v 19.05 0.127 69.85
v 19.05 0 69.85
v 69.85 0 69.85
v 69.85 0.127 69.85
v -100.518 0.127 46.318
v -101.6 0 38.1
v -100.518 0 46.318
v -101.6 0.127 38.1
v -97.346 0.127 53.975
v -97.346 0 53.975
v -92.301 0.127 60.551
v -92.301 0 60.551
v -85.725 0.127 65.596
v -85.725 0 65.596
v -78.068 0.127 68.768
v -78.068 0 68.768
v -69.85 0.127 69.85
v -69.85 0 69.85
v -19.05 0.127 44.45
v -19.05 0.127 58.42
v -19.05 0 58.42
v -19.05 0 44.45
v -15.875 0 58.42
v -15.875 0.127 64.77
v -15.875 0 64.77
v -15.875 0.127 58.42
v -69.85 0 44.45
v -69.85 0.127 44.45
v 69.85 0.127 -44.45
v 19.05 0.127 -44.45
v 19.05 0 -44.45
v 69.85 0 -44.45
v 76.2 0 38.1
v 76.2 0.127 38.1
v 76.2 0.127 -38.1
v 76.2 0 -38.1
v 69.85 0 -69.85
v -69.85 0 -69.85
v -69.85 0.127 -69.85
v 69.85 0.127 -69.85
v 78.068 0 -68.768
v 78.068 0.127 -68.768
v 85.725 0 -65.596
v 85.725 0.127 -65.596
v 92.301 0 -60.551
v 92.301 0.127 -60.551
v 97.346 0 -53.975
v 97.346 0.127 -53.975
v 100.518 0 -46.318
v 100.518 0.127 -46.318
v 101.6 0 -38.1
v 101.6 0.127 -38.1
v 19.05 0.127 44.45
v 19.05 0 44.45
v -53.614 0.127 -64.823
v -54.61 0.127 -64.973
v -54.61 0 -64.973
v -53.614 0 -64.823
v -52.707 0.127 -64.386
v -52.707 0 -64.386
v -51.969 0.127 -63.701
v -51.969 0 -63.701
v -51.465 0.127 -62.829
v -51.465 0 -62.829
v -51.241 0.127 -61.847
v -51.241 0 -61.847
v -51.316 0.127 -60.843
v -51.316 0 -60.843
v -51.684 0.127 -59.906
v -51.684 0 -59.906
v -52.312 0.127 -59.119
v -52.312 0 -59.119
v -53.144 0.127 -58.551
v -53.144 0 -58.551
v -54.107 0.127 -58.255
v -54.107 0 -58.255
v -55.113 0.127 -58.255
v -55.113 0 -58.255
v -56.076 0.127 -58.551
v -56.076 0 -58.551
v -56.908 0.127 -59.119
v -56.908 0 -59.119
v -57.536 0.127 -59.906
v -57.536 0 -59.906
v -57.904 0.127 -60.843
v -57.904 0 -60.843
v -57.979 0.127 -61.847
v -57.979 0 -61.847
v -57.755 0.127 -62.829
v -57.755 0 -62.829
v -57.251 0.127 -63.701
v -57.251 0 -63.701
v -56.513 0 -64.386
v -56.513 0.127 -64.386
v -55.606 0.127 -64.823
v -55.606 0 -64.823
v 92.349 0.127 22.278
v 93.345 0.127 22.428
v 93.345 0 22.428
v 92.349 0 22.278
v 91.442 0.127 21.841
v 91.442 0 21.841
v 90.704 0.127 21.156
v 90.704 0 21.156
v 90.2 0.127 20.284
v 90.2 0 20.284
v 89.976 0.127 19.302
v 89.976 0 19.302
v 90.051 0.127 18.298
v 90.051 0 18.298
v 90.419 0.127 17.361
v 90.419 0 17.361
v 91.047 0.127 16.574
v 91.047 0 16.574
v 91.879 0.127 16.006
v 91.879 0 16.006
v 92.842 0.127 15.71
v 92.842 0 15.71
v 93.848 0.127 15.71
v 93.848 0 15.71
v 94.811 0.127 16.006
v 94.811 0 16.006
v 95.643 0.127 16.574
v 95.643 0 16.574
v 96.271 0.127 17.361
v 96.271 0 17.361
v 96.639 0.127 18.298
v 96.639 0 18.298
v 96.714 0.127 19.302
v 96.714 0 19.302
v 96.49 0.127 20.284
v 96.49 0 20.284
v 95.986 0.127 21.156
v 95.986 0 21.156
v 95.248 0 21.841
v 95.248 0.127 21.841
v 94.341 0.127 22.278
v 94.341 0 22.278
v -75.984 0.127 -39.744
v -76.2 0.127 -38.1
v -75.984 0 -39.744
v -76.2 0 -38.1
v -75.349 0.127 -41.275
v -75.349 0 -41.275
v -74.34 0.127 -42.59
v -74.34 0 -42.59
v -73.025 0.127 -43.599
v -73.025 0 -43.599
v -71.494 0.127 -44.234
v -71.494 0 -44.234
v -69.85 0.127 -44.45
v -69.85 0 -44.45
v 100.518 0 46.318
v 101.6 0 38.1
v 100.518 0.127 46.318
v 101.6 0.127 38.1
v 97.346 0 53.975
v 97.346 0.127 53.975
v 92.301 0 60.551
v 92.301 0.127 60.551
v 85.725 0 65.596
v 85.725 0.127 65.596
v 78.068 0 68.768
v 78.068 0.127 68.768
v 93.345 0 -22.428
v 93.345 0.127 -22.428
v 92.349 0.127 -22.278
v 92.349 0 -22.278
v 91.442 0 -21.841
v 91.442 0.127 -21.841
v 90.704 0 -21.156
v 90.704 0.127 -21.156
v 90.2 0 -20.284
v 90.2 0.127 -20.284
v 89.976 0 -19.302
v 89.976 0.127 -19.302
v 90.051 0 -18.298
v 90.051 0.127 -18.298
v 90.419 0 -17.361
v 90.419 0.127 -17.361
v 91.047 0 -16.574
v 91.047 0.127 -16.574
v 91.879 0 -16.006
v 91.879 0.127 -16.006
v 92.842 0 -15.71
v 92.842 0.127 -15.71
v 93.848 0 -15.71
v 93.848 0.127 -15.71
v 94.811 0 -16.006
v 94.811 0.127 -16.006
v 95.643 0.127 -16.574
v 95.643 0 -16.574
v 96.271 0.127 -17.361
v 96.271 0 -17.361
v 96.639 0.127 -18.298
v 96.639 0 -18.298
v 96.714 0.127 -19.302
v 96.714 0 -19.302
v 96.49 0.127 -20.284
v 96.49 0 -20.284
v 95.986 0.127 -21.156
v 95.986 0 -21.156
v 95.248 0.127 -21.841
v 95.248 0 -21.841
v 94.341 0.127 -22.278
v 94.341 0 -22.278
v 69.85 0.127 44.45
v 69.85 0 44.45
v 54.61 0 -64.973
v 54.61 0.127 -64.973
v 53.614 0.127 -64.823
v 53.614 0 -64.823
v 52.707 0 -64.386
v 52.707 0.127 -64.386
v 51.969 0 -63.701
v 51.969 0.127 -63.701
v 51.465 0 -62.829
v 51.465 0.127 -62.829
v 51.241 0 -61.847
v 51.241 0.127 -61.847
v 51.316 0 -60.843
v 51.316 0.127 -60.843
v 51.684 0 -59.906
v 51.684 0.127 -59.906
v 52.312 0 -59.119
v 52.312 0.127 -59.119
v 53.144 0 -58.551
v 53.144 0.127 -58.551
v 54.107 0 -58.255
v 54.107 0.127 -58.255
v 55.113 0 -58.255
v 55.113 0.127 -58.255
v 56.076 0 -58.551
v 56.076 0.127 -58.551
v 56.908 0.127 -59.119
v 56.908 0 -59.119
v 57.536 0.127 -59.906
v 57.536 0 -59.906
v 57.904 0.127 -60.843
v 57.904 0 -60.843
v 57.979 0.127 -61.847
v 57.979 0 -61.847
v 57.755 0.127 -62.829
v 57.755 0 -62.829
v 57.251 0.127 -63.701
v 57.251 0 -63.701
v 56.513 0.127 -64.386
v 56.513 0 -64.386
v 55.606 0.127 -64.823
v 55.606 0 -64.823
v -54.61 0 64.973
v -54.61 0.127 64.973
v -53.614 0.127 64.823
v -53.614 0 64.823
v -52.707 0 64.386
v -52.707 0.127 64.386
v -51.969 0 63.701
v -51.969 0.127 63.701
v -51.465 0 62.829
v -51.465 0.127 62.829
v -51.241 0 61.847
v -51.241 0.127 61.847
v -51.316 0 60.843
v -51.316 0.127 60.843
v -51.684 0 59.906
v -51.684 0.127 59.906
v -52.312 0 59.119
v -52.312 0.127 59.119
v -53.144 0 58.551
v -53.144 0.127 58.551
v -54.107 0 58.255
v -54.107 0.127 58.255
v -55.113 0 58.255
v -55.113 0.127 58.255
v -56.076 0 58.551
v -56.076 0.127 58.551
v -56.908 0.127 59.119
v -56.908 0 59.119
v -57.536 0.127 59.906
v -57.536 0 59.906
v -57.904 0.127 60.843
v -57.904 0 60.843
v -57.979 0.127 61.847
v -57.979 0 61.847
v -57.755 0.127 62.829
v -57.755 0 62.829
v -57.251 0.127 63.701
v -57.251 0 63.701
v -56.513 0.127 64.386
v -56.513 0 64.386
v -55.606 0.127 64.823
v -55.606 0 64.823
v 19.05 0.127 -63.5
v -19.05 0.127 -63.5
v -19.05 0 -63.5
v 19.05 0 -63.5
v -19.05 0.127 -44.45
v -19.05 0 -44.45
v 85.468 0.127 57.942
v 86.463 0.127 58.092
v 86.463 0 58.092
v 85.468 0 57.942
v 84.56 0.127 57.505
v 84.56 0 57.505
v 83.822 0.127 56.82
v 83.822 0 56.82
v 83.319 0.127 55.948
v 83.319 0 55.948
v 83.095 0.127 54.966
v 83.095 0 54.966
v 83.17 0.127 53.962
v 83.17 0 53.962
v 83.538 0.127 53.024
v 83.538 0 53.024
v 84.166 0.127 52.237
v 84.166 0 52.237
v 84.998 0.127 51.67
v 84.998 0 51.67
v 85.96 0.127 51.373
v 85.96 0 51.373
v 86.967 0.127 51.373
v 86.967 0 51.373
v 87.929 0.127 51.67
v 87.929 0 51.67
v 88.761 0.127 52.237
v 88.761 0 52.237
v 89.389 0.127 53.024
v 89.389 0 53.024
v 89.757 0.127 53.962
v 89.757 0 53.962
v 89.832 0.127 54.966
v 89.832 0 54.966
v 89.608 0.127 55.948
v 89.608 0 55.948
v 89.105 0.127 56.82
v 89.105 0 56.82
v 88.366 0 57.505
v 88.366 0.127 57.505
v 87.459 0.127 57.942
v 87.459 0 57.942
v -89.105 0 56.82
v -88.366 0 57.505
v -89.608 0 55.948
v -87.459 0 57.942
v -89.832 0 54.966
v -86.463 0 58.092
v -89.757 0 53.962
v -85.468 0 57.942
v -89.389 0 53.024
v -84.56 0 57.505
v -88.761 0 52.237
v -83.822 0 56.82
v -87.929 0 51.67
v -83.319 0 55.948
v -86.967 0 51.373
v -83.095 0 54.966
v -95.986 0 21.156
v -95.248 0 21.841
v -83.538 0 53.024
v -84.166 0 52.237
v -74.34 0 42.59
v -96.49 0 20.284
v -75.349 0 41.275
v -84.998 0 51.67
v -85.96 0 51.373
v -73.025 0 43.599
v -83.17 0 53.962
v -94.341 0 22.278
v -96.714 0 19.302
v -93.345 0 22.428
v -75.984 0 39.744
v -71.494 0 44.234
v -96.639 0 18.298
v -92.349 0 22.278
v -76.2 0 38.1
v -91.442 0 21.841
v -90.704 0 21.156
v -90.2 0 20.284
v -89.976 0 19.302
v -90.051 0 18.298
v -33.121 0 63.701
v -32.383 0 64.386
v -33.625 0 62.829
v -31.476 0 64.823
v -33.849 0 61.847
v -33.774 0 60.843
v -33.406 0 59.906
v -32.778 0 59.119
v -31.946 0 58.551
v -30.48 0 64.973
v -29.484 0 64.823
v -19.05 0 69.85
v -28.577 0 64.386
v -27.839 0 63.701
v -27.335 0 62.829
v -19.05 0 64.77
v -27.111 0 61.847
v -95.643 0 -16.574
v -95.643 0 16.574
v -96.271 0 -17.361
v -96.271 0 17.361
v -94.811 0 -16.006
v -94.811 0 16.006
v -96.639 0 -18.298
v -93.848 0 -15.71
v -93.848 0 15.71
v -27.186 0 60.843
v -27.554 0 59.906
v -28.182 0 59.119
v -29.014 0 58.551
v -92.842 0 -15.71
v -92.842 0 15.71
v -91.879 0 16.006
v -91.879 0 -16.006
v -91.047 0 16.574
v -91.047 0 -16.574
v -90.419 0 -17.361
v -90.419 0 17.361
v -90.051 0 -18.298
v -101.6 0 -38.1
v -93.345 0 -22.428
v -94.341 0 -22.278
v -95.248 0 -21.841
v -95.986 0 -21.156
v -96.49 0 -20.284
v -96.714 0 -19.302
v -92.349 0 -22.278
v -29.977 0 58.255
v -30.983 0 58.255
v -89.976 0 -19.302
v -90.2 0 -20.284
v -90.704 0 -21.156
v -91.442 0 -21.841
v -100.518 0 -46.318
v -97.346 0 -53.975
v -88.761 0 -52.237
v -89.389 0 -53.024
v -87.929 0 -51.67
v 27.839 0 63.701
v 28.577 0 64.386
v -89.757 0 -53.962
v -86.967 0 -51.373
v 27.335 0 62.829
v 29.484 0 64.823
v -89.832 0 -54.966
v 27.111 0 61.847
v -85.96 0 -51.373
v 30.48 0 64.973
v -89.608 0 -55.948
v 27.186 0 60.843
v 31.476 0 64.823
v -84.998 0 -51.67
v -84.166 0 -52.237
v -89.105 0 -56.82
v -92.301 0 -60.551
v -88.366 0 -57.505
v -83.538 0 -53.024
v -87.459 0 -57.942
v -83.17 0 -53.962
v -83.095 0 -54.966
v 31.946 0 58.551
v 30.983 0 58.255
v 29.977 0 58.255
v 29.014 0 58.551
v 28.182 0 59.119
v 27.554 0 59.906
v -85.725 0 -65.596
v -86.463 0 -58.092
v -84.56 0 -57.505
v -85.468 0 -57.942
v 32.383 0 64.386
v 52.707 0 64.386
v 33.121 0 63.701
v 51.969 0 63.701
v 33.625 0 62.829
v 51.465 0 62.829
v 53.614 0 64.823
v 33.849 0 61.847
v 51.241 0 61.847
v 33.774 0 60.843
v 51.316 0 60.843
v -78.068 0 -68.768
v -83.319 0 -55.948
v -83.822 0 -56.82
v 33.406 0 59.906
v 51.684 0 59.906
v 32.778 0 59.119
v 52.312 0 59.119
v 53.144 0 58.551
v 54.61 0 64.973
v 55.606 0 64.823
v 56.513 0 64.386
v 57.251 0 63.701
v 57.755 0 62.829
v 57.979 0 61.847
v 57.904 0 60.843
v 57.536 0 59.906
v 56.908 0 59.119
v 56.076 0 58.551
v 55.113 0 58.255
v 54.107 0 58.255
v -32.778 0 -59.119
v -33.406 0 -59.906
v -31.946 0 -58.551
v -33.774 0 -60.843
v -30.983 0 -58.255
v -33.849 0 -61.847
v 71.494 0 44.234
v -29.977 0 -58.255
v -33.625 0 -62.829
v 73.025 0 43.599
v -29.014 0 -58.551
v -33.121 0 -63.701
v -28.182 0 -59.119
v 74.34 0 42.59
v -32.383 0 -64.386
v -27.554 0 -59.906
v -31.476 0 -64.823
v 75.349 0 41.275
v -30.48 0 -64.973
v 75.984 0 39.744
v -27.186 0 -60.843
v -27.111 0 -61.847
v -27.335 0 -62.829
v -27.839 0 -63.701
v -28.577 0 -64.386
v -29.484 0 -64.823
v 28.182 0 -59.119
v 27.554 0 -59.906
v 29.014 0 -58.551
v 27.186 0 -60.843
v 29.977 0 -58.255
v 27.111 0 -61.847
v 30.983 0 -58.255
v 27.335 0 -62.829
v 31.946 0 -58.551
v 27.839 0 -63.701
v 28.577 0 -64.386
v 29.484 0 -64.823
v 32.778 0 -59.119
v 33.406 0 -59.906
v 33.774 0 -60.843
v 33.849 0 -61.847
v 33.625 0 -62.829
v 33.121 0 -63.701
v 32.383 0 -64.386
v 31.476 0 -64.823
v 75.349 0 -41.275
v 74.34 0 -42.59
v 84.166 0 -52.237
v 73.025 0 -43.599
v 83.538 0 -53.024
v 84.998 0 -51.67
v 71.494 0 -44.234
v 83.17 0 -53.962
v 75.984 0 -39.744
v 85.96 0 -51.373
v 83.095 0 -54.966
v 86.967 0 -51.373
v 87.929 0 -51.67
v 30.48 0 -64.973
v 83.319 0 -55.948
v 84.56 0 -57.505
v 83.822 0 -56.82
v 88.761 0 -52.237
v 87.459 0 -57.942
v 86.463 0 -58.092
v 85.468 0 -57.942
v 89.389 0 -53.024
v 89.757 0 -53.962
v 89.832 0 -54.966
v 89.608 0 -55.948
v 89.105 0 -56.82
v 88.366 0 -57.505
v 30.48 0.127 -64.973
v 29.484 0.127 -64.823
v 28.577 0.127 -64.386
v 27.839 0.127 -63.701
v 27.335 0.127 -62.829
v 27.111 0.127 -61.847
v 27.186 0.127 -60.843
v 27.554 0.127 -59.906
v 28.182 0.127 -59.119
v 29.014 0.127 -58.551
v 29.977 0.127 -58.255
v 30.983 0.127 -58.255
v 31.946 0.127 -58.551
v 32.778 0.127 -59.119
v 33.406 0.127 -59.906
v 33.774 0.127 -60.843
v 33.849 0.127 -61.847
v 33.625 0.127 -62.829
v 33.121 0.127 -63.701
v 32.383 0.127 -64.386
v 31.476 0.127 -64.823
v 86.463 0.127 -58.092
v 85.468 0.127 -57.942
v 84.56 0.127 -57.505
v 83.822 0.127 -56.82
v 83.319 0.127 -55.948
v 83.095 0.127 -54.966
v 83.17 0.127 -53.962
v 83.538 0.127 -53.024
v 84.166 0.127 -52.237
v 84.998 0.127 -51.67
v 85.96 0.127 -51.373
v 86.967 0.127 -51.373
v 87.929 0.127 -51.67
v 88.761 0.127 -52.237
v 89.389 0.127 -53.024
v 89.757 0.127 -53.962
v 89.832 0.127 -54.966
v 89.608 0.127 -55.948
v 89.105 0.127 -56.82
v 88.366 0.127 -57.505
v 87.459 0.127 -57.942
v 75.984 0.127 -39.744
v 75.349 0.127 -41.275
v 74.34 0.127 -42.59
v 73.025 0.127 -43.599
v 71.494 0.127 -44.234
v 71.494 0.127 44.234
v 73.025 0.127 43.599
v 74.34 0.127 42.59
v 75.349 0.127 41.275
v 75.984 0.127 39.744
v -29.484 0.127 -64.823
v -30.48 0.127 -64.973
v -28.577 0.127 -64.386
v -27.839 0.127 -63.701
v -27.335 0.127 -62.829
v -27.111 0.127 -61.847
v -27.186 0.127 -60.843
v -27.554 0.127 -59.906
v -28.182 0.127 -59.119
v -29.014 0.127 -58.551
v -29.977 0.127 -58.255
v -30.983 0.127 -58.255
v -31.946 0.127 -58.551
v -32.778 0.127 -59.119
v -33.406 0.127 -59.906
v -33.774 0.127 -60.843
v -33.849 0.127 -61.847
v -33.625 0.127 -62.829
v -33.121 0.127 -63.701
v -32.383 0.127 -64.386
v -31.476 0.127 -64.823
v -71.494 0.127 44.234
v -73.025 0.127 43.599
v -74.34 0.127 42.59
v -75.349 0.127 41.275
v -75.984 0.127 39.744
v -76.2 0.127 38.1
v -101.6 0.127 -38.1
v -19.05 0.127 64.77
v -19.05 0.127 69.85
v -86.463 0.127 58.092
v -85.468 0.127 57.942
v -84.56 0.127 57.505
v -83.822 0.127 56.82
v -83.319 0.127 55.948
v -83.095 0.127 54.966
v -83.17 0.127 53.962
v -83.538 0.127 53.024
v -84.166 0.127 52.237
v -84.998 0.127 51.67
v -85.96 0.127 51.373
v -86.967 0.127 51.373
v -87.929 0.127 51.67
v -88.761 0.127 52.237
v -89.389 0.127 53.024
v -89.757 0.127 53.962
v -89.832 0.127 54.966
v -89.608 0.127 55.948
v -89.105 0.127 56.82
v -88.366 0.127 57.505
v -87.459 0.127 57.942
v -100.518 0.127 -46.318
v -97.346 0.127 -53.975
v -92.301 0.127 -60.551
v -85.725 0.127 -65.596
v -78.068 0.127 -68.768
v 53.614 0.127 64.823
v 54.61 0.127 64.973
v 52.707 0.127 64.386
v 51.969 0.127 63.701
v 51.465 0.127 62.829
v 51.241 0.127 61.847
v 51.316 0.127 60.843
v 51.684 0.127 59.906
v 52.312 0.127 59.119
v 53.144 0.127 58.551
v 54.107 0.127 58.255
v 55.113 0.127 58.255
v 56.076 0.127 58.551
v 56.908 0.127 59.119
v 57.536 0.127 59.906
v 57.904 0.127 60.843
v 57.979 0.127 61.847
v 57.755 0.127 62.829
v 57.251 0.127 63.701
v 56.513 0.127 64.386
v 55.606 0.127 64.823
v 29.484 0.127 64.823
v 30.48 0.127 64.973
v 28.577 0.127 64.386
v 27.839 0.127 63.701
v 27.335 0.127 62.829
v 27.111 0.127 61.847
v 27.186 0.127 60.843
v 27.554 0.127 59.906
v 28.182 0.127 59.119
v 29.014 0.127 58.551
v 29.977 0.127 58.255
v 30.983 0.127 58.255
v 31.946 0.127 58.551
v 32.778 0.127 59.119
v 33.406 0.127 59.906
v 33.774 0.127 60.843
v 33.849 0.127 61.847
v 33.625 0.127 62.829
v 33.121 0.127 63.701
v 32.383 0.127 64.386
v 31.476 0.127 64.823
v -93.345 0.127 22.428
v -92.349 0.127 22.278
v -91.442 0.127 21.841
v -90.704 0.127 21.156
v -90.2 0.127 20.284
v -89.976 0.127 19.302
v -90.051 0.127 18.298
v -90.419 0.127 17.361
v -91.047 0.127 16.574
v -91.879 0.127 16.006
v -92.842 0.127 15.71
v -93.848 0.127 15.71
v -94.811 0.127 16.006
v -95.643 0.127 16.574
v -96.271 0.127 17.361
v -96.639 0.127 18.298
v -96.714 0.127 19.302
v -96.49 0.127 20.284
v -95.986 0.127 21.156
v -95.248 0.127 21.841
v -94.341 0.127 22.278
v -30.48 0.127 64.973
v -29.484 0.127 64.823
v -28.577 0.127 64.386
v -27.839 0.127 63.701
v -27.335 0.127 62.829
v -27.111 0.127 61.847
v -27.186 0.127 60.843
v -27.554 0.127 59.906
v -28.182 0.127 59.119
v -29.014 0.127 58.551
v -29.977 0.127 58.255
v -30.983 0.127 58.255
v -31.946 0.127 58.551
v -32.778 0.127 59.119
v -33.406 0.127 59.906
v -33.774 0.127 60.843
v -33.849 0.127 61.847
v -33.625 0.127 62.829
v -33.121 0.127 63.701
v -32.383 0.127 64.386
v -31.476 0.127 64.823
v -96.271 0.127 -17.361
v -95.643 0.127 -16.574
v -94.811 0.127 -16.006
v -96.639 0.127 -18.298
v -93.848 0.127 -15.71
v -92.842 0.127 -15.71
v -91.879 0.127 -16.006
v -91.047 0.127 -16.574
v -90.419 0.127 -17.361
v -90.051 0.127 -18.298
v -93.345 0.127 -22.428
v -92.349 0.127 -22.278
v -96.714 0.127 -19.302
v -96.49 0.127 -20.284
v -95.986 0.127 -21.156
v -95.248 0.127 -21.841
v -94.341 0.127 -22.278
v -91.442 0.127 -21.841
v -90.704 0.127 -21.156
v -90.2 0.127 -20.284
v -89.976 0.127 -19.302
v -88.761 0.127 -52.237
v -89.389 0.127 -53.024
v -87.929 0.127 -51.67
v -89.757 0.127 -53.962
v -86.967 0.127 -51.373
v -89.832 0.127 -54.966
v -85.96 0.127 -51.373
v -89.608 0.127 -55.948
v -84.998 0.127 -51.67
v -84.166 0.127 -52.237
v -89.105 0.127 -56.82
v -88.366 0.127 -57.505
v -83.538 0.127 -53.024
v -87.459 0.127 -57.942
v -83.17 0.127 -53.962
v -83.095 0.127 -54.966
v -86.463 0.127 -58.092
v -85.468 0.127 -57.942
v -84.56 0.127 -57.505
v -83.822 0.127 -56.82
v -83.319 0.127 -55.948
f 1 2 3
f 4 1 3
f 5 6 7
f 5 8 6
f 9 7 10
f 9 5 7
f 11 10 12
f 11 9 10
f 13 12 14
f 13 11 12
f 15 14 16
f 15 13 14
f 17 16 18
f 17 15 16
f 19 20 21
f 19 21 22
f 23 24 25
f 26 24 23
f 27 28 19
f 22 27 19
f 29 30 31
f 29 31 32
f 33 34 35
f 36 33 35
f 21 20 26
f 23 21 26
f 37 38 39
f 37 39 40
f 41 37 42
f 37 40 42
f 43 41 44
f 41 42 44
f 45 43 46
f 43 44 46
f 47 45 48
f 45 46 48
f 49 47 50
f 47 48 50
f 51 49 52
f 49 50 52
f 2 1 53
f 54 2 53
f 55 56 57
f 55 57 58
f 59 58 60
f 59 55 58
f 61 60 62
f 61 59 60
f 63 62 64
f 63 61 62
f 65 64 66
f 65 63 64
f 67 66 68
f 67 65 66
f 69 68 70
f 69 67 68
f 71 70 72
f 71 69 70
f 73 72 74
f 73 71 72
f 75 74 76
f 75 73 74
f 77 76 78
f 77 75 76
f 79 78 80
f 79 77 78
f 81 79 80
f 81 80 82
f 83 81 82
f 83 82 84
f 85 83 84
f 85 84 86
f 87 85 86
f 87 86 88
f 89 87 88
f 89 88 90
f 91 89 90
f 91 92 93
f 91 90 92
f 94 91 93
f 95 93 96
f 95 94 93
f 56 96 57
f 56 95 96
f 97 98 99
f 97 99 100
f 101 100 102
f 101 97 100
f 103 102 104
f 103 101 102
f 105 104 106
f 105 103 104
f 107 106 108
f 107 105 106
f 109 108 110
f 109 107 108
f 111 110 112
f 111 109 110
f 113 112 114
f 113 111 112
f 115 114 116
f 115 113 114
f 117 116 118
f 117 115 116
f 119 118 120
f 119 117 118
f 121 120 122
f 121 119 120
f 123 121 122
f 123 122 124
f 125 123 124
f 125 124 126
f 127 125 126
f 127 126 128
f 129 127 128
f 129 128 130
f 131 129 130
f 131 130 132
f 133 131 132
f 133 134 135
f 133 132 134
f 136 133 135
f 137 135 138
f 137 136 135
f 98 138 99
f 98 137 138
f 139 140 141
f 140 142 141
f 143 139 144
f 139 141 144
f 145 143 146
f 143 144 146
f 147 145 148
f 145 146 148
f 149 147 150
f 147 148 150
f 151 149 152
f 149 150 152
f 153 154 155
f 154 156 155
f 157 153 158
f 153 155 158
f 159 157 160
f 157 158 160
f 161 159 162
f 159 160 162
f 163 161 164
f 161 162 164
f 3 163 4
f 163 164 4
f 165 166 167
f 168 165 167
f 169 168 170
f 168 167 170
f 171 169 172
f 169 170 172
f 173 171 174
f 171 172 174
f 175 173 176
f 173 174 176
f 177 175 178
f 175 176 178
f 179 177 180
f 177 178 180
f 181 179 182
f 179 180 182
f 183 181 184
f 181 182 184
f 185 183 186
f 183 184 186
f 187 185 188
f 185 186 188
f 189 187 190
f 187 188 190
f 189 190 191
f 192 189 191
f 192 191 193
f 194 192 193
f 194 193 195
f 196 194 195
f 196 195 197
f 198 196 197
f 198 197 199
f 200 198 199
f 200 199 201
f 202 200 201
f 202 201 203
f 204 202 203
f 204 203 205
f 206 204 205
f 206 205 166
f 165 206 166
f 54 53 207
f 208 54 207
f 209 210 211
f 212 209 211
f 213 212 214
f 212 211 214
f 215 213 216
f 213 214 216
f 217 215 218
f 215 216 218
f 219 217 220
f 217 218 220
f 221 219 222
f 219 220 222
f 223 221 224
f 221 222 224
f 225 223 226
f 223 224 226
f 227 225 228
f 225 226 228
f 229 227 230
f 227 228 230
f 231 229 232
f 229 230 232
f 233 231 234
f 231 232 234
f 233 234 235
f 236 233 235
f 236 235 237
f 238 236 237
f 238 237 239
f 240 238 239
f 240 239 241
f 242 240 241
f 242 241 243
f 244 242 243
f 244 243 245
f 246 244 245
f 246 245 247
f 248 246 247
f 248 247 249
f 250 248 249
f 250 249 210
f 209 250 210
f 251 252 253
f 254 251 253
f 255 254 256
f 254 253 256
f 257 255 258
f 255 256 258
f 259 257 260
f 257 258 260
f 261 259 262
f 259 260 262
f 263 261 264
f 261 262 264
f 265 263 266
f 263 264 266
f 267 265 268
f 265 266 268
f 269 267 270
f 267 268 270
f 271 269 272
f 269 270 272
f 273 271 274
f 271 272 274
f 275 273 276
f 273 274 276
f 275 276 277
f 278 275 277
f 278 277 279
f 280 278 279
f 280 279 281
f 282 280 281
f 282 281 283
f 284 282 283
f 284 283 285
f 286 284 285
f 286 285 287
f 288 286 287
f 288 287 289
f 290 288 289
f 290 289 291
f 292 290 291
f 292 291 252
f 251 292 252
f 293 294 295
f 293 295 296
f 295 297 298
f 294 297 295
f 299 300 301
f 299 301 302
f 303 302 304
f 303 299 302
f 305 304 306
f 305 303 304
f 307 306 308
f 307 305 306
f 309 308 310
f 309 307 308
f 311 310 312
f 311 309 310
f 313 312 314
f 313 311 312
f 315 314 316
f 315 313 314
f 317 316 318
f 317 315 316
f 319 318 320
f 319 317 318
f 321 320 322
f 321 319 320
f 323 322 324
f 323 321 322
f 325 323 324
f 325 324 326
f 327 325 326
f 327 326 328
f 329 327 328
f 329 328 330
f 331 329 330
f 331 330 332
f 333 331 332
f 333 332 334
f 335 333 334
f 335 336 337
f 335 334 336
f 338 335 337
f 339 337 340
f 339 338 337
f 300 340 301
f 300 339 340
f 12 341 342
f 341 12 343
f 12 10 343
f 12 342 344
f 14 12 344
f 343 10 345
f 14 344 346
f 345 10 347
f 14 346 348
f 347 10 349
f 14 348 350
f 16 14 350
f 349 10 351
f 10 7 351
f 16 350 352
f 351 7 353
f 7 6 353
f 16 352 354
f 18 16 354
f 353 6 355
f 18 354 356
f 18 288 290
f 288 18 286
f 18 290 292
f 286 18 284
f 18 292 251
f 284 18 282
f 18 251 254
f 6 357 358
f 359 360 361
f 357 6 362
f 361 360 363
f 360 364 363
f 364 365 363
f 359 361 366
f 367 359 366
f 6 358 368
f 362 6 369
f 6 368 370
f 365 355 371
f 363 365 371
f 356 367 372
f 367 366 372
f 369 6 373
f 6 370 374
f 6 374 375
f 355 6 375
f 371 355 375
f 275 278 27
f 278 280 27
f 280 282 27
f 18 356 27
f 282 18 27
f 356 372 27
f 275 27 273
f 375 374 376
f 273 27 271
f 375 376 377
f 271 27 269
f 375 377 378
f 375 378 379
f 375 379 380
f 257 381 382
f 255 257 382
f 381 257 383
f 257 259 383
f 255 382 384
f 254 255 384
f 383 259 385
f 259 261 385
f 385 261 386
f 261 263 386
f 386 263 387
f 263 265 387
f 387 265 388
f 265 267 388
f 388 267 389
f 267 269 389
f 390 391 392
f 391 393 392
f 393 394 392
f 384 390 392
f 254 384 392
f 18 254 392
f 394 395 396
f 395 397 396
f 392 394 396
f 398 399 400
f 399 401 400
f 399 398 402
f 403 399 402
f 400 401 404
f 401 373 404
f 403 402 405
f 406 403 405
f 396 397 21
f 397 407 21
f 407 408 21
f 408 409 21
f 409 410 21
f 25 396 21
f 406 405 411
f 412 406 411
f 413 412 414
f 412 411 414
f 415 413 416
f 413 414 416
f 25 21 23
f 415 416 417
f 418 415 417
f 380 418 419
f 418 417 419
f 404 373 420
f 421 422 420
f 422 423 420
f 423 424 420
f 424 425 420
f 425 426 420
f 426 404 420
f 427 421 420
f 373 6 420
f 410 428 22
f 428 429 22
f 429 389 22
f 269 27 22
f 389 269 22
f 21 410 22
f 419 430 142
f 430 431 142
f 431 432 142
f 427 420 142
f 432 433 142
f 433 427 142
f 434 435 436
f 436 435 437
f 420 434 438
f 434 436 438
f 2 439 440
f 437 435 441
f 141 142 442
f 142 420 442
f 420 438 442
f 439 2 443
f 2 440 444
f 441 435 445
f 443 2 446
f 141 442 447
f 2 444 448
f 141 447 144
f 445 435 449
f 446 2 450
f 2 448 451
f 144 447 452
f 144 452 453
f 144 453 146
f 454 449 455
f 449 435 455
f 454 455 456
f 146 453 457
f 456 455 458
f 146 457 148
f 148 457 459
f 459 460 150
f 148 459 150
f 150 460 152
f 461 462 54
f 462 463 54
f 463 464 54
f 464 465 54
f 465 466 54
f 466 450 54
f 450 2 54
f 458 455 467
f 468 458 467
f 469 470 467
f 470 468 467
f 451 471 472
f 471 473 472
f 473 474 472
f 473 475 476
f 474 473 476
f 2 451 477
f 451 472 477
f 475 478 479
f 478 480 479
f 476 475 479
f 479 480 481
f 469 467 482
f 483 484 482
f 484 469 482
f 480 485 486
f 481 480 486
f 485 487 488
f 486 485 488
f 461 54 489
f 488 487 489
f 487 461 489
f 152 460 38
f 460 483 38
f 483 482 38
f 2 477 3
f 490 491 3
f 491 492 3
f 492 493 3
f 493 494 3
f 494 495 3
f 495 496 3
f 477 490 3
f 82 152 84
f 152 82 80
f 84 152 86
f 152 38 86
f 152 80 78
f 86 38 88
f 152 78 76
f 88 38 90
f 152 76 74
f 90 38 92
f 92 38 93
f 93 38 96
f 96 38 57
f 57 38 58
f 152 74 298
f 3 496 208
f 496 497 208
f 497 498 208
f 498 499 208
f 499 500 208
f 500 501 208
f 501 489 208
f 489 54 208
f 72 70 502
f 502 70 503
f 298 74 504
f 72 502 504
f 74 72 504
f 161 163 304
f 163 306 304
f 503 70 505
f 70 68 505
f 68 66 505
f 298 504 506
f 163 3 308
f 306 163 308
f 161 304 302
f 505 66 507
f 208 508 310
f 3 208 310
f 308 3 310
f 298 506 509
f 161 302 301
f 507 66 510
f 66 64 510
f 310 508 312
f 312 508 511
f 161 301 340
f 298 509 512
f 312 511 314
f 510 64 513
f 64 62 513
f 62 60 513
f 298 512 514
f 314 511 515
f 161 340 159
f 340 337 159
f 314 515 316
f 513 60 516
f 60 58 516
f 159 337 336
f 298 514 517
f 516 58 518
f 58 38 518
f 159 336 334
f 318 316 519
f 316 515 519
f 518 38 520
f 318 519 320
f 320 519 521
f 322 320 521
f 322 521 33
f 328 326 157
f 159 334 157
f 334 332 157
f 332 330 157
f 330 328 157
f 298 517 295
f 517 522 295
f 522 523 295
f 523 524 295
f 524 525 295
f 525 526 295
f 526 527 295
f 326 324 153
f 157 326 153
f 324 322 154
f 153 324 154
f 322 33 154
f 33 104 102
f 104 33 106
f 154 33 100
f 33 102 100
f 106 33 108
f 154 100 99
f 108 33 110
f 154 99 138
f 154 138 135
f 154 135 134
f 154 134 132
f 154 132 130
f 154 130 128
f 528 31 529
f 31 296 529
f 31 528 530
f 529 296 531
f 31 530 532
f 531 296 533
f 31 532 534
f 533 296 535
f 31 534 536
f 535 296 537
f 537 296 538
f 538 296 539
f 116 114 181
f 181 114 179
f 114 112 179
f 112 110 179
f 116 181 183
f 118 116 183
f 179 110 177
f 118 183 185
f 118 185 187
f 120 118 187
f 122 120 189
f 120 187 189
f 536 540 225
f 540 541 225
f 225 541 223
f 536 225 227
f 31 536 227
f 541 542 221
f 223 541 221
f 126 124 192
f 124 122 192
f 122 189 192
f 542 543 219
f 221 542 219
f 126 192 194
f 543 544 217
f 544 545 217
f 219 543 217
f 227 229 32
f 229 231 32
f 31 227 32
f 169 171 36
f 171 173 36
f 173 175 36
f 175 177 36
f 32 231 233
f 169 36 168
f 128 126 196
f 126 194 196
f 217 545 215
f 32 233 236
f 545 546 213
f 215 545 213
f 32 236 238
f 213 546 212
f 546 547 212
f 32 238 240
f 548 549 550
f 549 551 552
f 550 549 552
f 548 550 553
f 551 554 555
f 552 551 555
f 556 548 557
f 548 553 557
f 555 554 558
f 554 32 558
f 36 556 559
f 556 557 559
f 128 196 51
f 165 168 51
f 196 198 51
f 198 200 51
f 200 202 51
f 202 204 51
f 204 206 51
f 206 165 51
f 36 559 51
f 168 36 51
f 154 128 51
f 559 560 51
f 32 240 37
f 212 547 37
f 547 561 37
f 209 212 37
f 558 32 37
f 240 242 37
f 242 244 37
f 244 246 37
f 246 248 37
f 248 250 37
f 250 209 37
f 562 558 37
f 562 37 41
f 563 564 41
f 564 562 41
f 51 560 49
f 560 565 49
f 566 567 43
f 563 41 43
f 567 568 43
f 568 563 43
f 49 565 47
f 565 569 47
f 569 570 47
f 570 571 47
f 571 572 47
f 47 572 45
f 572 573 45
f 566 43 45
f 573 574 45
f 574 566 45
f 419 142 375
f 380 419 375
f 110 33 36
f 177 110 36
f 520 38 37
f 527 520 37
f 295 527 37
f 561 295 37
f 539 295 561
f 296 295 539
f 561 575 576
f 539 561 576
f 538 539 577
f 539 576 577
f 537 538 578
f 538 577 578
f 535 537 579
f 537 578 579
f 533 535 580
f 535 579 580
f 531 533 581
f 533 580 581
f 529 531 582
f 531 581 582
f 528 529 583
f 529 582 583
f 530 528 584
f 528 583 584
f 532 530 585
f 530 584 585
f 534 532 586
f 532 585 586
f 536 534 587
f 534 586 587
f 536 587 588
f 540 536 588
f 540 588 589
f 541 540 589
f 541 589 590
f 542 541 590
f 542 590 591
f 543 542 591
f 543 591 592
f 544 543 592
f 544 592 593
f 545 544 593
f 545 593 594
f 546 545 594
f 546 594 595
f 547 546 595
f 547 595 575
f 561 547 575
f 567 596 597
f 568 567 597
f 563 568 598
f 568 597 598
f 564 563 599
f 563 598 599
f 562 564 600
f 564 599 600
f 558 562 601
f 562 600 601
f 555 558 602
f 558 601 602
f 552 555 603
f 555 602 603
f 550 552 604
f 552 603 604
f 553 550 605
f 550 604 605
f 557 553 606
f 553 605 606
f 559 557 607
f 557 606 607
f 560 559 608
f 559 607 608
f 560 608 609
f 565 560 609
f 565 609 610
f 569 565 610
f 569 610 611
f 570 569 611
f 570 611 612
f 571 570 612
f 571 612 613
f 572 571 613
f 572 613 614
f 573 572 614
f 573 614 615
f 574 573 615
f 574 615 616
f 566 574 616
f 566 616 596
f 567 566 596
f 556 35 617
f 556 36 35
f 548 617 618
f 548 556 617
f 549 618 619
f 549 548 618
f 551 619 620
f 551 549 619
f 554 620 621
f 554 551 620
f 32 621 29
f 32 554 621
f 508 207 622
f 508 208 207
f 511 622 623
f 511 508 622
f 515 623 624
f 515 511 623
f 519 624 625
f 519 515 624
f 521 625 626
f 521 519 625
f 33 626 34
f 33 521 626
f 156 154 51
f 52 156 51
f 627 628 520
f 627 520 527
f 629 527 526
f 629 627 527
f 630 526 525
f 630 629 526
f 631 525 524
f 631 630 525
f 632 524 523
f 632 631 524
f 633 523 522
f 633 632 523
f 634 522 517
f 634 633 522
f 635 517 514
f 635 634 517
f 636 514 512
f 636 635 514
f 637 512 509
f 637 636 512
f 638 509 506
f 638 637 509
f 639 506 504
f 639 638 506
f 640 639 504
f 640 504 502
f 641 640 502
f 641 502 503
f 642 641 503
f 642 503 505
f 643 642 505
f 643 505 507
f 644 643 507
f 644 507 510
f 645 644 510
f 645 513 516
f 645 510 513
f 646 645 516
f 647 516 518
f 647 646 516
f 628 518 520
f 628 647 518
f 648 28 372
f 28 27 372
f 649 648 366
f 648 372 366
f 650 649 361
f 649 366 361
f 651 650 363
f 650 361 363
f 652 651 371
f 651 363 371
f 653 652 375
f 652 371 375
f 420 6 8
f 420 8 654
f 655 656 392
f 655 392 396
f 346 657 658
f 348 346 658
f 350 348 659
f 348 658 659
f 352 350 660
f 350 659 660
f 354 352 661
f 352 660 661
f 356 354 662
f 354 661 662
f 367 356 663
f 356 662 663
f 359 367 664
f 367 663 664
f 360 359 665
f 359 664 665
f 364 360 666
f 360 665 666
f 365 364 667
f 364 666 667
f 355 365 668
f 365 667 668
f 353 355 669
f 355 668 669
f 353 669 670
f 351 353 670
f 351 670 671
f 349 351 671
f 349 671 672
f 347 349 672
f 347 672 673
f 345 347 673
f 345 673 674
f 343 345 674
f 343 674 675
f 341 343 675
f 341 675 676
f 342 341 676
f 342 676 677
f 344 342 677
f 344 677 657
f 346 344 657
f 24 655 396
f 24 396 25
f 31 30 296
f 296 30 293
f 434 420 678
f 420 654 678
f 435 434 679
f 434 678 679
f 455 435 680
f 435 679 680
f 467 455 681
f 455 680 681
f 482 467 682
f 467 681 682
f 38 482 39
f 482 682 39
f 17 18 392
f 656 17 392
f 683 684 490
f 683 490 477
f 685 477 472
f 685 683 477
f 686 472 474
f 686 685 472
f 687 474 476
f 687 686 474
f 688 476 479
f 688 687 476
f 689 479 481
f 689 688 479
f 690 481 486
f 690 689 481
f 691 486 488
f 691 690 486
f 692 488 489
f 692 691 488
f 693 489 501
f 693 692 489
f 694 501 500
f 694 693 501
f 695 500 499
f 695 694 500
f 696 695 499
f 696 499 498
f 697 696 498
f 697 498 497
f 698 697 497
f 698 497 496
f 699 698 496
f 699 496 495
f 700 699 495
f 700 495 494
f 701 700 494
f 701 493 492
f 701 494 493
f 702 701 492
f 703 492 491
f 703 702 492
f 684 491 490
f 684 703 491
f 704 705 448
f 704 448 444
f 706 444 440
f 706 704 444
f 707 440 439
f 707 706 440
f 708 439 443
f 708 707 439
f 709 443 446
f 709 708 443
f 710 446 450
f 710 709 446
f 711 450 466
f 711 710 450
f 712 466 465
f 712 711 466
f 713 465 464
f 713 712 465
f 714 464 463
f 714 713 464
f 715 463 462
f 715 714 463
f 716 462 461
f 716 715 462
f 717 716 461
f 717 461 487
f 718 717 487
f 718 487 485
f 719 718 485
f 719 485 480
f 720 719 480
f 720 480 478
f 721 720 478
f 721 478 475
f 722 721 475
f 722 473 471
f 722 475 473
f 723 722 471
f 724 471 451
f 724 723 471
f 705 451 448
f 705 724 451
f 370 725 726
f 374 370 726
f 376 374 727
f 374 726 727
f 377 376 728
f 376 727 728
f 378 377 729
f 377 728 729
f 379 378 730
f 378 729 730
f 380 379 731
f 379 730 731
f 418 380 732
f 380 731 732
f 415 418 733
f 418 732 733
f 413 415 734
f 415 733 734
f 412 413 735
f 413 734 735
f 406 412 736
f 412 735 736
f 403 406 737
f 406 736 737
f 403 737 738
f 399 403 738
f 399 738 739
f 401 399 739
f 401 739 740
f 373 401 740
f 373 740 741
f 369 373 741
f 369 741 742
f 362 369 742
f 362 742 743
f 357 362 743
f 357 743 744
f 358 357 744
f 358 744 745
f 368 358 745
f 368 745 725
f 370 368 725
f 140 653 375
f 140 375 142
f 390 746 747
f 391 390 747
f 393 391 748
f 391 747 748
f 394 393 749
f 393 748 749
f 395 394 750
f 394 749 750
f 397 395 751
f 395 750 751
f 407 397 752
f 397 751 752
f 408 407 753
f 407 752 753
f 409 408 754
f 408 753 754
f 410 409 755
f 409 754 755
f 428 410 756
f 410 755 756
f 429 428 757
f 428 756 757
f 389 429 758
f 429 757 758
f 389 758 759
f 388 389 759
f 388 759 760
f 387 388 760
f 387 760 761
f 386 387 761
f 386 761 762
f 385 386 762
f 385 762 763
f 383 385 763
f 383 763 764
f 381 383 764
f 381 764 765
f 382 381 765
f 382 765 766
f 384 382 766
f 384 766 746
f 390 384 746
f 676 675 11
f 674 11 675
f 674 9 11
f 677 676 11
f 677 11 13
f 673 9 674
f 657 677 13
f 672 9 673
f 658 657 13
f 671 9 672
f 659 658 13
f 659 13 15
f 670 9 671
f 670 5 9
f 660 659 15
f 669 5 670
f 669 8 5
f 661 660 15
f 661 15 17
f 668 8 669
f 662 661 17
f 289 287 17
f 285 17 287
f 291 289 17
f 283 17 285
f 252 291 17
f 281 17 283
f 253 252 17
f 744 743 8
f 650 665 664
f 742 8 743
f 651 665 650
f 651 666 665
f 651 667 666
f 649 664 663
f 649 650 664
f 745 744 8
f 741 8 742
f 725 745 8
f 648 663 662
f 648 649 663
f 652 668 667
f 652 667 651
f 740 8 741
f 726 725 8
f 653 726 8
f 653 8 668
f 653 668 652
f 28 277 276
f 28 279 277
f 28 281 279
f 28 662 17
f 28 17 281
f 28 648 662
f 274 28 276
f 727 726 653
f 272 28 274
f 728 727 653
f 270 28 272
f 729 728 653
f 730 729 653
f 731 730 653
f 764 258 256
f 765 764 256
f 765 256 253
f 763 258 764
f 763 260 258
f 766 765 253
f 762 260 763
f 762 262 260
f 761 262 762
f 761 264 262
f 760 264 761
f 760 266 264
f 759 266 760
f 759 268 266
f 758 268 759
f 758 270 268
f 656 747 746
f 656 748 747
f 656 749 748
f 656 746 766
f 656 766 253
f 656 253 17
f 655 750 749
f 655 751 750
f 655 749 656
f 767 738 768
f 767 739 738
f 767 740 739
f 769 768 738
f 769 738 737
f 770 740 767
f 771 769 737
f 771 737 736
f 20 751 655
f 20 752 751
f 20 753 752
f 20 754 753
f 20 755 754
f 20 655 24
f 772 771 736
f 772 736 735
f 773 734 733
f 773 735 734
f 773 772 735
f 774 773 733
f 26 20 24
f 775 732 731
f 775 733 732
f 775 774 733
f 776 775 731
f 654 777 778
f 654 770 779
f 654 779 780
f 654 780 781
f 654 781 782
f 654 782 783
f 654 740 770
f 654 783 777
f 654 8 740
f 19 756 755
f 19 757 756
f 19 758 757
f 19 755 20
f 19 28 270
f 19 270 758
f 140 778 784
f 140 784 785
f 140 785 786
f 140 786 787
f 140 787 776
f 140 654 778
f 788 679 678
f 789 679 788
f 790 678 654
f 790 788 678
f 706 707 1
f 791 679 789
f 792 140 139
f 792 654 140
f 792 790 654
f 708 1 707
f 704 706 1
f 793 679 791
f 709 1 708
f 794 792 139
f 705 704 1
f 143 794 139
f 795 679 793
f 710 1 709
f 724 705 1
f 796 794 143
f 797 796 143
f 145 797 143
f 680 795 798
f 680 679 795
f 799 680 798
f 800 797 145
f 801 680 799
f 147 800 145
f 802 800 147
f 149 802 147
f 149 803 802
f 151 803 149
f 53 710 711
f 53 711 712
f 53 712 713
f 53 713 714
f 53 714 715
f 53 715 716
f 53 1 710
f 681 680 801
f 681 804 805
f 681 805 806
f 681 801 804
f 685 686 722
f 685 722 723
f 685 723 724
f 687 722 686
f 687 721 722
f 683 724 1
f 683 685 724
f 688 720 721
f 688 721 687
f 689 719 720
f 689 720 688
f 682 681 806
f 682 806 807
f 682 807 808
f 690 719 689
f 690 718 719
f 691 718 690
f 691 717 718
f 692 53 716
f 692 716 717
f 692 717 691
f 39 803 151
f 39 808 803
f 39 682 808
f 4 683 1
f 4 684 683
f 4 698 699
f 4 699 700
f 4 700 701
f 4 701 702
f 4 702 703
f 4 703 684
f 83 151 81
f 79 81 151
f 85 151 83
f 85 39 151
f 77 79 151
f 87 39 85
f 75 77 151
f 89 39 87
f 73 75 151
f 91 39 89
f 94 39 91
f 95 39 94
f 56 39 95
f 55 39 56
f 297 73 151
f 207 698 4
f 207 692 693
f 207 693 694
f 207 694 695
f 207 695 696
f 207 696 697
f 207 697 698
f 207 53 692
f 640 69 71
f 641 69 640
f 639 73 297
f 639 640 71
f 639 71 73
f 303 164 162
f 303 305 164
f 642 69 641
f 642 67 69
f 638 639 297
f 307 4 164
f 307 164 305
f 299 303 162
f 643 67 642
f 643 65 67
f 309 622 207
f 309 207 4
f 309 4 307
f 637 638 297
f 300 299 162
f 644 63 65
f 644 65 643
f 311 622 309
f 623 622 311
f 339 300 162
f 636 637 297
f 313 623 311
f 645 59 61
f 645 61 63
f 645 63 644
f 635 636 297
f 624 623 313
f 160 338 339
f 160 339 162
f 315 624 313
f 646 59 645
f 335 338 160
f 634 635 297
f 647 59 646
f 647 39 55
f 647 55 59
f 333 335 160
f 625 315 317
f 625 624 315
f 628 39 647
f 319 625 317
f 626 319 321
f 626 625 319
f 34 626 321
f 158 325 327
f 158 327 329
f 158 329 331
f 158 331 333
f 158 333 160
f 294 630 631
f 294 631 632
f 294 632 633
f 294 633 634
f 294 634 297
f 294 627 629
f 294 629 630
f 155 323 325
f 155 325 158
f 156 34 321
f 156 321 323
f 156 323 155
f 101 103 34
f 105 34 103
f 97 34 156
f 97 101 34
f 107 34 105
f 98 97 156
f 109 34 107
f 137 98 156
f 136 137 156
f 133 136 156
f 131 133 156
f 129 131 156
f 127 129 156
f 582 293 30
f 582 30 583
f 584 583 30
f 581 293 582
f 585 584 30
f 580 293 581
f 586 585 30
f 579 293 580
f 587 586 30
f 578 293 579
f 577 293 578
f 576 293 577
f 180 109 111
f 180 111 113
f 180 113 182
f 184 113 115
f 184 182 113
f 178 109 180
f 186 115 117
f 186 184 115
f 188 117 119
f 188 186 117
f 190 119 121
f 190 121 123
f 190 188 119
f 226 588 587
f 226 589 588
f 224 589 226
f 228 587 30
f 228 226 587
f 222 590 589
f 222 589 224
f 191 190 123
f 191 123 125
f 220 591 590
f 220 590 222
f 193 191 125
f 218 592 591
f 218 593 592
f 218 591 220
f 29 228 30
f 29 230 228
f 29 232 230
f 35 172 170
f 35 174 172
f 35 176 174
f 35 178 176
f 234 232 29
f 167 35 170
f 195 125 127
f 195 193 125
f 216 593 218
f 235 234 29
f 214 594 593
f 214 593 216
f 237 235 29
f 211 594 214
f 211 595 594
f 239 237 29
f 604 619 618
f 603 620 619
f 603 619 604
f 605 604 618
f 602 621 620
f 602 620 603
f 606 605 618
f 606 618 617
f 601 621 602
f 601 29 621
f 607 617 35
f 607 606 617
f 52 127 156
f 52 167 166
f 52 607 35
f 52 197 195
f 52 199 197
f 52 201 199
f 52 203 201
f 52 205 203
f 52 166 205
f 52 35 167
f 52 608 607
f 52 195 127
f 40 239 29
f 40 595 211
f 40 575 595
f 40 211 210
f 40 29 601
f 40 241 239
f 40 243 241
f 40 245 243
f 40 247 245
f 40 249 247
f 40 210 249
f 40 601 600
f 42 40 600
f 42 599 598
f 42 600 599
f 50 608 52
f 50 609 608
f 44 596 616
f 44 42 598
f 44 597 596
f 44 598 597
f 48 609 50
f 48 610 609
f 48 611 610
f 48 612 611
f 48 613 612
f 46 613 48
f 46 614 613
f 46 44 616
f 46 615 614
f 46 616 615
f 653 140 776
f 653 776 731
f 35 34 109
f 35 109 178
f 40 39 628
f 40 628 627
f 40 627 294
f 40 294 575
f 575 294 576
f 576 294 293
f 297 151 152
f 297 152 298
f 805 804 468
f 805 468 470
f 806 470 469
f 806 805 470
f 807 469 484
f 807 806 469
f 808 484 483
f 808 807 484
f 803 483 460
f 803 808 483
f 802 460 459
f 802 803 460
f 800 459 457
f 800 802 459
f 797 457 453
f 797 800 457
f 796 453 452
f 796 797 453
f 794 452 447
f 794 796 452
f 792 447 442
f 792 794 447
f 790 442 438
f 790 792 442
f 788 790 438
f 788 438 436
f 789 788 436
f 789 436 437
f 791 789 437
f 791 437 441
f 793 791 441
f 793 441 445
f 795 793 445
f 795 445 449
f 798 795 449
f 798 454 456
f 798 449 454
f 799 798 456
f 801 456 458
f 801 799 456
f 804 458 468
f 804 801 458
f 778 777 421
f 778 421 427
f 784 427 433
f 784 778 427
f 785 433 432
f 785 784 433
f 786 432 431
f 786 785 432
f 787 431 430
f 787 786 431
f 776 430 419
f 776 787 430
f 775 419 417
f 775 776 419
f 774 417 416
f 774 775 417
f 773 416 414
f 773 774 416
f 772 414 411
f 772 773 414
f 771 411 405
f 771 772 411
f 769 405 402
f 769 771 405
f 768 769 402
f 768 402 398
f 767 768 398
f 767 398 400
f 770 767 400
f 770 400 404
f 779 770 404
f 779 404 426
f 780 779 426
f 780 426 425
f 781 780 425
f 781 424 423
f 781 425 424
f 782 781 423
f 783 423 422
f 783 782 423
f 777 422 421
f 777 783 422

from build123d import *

# Parameters (mm, degrees)
SKETCH1_W                = 203.2
SKETCH1_H                = 139.7
BASE_EXTRUDE_DEPTH       = 0.127
SKETCH2_W                = 152.4
SKETCH2_H                = 88.9
CENTER_CUT_DEPTH         = 124.294763186
SKETCH3_W                = 38.1
SKETCH3_H                = 215.9
VETICAL_CUT_DEPTH        = 124.294763186
FILLET_1_R               = 31.75
SKETCH4_W                = 6.35
SKETCH4_H                = 6.35
SQUARE_EXTRUDE_DEPTH     = 0.127
SKETCH7_R                = 3.3782
CIRCULAR_EXTRUDE_DEPTH   = 124.294763186
MIRROR_2_COPY_1_SKETCH_R = 3.3782
MIRROR_2_COPY_1_DEPTH    = 124.294763186
FILLET_2_R               = 6.35


with BuildPart() as part:
    # Sketch1 → Base Extrude (new body)
    with BuildSketch(Plane(origin=(0, 0, 0), x_dir=(1, 0, 0), z_dir=(0, 1, 0))):
        Rectangle(SKETCH1_W, SKETCH1_H)
    extrude(amount=BASE_EXTRUDE_DEPTH)

    # Sketch2 → Center Cut (cut, through all)
    with BuildSketch(Plane(origin=(0, 0.127, 0), x_dir=(1, 0, 0), z_dir=(0, 1, 0))):
        Rectangle(SKETCH2_W, SKETCH2_H)
    extrude(amount=-CENTER_CUT_DEPTH, mode=Mode.SUBTRACT)

    # Sketch3 → Vetical Cut (cut, through all)
    with BuildSketch(Plane(origin=(0, 0.127, 0), x_dir=(1, 0, 0), z_dir=(0, 1, 0))):
        with Locations((0, -44.45)):
            Rectangle(SKETCH3_W, SKETCH3_H)
    extrude(amount=-VETICAL_CUT_DEPTH, mode=Mode.SUBTRACT)

    # Fillet 1
    fillet_1_edges = [part.edges().sort_by_distance(p)[0] for p in [
        (-101.6, 0.0635, -69.85),
        (101.6, 0.0635, -69.85),
        (101.6, 0.0635, 69.85),
        (-101.6, 0.0635, 69.85),
    ]]
    fillet(fillet_1_edges, radius=FILLET_1_R)

    # Sketch4 → Square Extrude (add)
    with BuildSketch(Plane(origin=(0, 0.127, 0), x_dir=(1, 0, 0), z_dir=(0, 1, 0))):
        with Locations((-19.05, -61.595)):
            Rectangle(SKETCH4_W, SKETCH4_H)
    extrude(amount=-SQUARE_EXTRUDE_DEPTH)

    # Sketch7 → Circular Extrude (cut, through all)
    with BuildSketch(Plane(origin=(0, 0.127, 0), x_dir=(1, 0, 0), z_dir=(0, 1, 0))):
        with Locations(Location((-93.345, -19.05, 0), (0, 0, 270))):
            Circle(SKETCH7_R)
        with Locations(Location((-86.463473824, -54.713473824, 0), (0, 0, 270))):
            Circle(SKETCH7_R)
        with Locations(Location((-30.48, -61.595, 0), (0, 0, 270))):
            Circle(SKETCH7_R)
        with Locations(Location((-54.61, -61.595, 0), (0, 0, 270))):
            Circle(SKETCH7_R)
    circular_extrude = extrude(amount=-CIRCULAR_EXTRUDE_DEPTH, mode=Mode.SUBTRACT)

    # Mirror 1: Circular Extrude across plane
    add(circular_extrude.mirror(Plane(origin=(0, 0, 0), x_dir=(0, 0, 1), z_dir=(1, 0, 0))), mode=Mode.SUBTRACT)

    # Mirror 2: Circular Extrude across plane
    add(circular_extrude.mirror(Plane.XY), mode=Mode.SUBTRACT)

    # Mirror 2 copy 1 sketch → Mirror 2 copy 1 (cut, through all)
    with BuildSketch(Plane(origin=(0, 0.127, 0), x_dir=(-1, 0, 0), z_dir=(0, 1, 0))):
        with Locations(Location((-93.345, -19.05, 0), (0, 0, 270))):
            Circle(MIRROR_2_COPY_1_SKETCH_R)
        with Locations(Location((-86.463473824, -54.713473824, 0), (0, 0, 270))):
            Circle(MIRROR_2_COPY_1_SKETCH_R)
        with Locations(Location((-30.48, -61.595, 0), (0, 0, 270))):
            Circle(MIRROR_2_COPY_1_SKETCH_R)
        with Locations(Location((-54.61, -61.595, 0), (0, 0, 270))):
            Circle(MIRROR_2_COPY_1_SKETCH_R)
    extrude(amount=-MIRROR_2_COPY_1_DEPTH, mode=Mode.SUBTRACT)

    # Fillet 2
    fillet_2_edges = [part.edges().sort_by_distance(p)[0] for p in [
        (-76.2, 0.0635, 44.45),
        (-76.2, 0.0635, -44.45),
        (76.2, 0.0635, -44.45),
        (76.2, 0.0635, 44.45),
    ]]
    fillet(fillet_2_edges, radius=FILLET_2_R)


solid = part.part
